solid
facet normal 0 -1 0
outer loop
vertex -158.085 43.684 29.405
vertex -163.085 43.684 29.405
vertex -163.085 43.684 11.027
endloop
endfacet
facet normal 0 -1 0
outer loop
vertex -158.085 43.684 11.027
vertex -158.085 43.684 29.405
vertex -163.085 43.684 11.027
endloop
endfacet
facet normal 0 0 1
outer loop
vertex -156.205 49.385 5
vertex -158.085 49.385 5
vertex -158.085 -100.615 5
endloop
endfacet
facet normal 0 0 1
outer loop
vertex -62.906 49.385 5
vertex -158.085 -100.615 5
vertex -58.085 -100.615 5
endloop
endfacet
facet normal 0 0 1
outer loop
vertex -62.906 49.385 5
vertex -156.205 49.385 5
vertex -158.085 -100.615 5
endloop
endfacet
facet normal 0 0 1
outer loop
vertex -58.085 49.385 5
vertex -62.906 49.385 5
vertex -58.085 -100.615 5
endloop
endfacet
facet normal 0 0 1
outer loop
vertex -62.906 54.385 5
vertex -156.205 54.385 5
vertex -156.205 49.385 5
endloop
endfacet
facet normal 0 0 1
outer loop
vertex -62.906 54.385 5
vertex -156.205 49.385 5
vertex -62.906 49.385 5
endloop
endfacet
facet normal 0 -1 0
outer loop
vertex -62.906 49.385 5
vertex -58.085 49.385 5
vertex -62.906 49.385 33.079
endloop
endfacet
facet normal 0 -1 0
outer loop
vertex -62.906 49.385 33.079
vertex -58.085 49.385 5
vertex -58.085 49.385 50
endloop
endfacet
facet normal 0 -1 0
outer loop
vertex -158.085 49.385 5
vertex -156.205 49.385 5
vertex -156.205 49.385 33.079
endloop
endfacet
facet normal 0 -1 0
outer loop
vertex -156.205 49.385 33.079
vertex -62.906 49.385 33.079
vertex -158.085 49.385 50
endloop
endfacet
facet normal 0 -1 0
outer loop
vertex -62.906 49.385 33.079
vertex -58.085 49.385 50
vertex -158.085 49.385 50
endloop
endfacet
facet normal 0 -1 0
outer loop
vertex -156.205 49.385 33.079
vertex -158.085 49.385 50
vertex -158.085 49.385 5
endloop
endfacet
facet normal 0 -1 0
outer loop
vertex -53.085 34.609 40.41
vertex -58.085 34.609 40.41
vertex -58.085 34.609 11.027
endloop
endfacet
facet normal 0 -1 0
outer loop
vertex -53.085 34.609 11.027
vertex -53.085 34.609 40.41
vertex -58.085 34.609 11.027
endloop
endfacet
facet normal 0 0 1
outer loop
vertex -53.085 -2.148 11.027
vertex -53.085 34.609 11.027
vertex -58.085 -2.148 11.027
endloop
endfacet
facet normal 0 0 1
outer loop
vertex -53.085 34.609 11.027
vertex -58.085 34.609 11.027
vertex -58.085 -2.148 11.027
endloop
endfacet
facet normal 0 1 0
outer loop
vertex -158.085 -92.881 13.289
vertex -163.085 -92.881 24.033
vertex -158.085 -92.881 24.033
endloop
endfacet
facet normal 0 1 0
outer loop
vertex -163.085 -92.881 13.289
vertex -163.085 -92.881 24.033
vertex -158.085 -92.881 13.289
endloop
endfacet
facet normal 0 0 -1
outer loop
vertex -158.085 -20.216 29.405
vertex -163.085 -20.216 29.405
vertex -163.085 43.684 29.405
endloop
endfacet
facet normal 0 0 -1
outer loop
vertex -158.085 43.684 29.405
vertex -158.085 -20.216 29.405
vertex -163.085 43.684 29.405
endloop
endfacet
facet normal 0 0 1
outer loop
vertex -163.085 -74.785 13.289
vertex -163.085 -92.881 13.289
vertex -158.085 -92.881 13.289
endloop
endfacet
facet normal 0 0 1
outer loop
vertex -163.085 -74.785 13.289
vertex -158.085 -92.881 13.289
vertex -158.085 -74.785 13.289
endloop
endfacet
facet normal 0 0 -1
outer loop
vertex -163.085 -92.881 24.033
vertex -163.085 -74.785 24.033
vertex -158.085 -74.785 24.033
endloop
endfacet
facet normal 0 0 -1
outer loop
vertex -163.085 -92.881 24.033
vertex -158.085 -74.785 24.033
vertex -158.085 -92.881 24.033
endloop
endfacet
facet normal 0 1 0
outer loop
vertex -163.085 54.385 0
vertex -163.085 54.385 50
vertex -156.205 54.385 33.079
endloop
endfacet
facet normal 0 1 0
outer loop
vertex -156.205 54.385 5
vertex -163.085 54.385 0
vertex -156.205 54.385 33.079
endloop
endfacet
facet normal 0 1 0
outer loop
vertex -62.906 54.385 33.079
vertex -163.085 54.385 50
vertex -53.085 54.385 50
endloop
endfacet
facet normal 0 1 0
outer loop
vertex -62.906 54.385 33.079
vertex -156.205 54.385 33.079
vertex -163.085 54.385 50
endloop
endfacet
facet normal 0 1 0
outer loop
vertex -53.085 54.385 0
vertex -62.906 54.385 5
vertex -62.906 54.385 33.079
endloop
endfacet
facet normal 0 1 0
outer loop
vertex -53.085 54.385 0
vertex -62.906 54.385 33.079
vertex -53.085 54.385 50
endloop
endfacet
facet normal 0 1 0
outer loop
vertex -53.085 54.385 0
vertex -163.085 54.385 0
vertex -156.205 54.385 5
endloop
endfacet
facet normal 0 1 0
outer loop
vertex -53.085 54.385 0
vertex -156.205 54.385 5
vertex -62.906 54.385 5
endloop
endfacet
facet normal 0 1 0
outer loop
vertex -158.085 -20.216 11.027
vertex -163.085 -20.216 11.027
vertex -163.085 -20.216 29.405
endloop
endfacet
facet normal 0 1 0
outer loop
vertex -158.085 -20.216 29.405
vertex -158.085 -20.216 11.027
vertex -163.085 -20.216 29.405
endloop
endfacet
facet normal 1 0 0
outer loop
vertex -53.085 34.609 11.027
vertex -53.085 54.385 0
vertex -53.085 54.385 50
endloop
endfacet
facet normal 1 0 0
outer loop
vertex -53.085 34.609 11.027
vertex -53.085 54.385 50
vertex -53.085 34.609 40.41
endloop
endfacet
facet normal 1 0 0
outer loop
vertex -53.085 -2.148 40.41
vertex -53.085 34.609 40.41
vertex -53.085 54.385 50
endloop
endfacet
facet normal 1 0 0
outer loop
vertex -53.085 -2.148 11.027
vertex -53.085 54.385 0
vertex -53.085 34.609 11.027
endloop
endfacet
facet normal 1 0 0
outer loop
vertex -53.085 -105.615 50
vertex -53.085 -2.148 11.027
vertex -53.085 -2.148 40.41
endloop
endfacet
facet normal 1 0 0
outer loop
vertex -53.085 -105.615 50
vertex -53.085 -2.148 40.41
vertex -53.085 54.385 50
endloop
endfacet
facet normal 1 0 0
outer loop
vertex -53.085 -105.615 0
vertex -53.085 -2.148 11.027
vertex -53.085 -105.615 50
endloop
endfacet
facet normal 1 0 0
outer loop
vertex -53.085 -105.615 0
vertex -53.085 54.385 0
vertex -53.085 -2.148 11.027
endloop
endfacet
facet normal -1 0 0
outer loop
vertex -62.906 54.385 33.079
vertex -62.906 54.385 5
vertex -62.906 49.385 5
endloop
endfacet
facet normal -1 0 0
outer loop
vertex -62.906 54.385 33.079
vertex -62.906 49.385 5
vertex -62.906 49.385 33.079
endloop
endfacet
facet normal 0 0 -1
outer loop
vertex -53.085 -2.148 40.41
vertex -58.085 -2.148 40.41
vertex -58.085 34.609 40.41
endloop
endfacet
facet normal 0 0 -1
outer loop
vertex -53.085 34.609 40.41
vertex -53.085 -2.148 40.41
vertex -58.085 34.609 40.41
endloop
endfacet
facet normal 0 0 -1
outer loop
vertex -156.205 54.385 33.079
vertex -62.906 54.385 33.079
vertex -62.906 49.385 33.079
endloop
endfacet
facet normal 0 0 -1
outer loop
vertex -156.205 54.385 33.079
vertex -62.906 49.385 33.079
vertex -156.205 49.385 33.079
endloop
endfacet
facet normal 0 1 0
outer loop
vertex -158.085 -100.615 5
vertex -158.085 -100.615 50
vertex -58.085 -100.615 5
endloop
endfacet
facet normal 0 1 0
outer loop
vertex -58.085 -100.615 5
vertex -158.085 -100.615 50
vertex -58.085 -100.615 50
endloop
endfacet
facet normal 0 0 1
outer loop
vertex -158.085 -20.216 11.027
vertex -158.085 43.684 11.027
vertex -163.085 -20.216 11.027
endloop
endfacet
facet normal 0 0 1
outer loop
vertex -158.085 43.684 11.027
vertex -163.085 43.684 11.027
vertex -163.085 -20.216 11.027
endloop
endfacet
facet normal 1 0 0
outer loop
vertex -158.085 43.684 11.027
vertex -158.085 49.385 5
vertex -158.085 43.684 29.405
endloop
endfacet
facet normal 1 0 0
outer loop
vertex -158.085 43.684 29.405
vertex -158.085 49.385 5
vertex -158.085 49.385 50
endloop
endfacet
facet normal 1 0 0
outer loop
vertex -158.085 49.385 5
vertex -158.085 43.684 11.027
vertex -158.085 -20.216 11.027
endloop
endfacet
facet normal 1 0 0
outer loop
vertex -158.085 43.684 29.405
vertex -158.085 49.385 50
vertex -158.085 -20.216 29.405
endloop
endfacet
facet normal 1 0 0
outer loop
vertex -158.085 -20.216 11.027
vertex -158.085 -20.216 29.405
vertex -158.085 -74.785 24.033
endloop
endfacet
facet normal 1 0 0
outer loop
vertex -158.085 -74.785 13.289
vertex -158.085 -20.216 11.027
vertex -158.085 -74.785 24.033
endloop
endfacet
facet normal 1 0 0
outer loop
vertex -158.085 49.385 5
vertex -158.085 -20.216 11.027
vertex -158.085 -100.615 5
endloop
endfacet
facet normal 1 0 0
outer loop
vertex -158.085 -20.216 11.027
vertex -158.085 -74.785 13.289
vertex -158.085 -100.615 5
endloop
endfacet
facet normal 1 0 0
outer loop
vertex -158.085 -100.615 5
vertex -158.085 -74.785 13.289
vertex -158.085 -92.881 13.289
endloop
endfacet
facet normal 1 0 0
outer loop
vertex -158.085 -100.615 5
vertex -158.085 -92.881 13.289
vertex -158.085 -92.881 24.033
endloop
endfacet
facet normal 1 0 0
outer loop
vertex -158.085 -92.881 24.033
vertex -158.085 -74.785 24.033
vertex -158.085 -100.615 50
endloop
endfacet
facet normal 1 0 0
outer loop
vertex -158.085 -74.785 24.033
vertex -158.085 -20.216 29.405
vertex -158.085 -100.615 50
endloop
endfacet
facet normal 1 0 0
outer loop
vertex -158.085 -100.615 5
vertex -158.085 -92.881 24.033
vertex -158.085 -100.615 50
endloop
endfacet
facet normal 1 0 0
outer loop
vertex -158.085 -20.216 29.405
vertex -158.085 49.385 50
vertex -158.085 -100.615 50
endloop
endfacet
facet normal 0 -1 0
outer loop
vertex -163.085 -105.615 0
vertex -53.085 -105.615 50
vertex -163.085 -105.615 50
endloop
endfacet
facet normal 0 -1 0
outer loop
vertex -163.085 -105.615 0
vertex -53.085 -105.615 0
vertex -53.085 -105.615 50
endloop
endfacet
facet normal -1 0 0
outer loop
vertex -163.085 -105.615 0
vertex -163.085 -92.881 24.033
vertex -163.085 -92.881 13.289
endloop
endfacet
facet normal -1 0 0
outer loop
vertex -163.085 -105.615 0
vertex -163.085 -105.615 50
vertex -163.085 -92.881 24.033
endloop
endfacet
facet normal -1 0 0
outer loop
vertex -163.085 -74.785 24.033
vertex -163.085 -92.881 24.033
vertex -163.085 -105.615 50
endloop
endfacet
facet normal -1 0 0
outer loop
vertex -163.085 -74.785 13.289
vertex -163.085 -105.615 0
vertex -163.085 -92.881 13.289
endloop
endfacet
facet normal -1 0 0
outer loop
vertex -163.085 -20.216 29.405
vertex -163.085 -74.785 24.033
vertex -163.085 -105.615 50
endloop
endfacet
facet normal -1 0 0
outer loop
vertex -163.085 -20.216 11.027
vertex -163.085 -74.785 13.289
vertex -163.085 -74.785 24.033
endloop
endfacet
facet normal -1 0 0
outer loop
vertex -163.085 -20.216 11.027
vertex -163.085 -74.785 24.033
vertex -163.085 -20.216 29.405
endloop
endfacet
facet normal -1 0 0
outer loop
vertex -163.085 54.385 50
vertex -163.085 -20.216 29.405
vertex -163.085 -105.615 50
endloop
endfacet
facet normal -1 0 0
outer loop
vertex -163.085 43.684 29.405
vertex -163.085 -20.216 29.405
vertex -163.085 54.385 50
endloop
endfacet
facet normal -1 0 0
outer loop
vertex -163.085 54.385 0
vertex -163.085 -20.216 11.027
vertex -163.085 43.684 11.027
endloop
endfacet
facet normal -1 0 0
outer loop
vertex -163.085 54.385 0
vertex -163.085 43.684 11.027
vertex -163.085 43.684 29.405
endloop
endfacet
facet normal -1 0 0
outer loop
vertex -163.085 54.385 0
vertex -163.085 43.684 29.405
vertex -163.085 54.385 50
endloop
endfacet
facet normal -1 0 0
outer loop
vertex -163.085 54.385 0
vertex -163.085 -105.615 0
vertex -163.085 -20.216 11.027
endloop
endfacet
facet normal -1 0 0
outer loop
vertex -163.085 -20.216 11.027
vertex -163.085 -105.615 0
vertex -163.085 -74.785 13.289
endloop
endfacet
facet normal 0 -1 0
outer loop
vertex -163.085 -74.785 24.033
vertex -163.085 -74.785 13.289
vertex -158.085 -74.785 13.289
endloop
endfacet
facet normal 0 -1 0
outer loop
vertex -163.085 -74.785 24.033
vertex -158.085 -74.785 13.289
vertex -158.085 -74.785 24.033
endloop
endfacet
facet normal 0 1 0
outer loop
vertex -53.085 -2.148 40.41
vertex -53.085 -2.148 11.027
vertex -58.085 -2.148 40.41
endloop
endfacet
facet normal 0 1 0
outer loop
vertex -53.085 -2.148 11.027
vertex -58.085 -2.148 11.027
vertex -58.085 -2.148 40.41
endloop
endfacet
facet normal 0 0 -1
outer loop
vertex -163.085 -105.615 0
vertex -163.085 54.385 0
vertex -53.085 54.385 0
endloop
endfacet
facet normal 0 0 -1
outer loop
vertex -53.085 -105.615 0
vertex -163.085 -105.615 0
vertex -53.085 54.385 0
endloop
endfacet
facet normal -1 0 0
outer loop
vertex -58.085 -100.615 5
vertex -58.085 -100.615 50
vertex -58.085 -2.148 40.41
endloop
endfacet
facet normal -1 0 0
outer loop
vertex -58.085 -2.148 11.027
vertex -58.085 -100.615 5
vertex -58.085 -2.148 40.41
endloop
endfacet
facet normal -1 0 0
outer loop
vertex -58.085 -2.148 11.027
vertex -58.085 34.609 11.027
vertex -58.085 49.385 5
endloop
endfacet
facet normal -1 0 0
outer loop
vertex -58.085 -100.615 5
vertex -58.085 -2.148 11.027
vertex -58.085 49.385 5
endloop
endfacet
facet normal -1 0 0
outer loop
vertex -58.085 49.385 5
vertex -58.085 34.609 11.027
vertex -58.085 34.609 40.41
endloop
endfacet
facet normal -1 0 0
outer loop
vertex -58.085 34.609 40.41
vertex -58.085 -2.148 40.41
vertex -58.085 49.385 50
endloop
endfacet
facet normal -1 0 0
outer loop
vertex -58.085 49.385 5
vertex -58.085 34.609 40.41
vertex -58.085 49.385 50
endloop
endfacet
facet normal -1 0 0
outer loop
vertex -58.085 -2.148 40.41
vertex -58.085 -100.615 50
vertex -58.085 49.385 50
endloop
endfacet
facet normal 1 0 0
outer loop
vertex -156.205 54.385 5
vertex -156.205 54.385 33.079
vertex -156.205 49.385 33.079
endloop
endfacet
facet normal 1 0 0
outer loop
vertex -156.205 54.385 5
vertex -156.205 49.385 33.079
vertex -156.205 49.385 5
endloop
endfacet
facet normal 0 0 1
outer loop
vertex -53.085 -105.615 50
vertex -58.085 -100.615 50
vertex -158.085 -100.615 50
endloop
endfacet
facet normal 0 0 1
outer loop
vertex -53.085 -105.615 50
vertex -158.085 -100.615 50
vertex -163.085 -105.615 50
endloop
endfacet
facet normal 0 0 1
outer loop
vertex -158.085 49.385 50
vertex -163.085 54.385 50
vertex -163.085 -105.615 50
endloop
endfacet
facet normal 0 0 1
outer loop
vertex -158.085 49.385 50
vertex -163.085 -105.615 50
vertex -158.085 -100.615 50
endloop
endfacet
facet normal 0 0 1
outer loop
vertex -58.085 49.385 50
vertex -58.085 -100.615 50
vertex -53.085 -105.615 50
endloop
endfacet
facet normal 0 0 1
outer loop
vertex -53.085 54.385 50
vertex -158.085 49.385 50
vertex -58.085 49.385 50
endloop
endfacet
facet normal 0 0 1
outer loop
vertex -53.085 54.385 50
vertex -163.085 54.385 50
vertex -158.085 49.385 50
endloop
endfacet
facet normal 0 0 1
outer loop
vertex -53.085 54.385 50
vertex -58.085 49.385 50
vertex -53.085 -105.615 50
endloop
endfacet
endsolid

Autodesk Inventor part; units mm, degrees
ref_plane "YZ Plane" through (0, 0, 0) normal (1, 0, 0) x (0, 1, 0)
ref_plane "XZ Plane" through (0, 0, 0) normal (0, 1, 0) x (-1, 0, 0)
ref_plane "XY Plane" through (0, 0, 0) normal (0, 0, 1) x (1, 0, 0)
sketch "Sketch3" plane through (0, 0, 0) normal (0, 0, 1) x (1, 0, 0)
  line L0 (-163.0852, 54.3849) -> (-53.0852, 54.3849)
  line L1 (-53.0852, 54.3849) -> (-53.0852, -105.6151)
  line L2 (-53.0852, -105.6151) -> (-163.0852, -105.6151)
  line L3 (-163.0852, -105.6151) -> (-163.0852, 54.3849)
  point P0 (0, 0)
  dimension "d2" = 110
  dimension "d3" = 160
  dimension "d4" = 110
extrude "Extrusion1" add sketch "Sketch3" along normal blind 50
sketch "Sketch4" plane through (0, 0, 50) normal (0, 0, 1) x (1, 0, 0)
  point P0 (0, 0)
sketch "Sketch5" plane through (0, 0, 50) normal (0, 0, 1) x (1, 0, 0)
  line L0 (-163.0852, 54.3849) -> (-163.0852, -105.6151) projected
  line L1 (-163.0852, 54.3849) -> (-163.0852, 49.3849)
  line L2 (-163.0852, 49.3849) -> (-158.0852, 49.3849)
  line L3 (-158.0852, 49.3849) -> (-158.0852, -100.6151)
  line L4 (-158.0852, -100.6151) -> (-58.0852, -100.6151)
  line L5 (-58.0852, -100.6151) -> (-58.0852, 49.3849)
  line L6 (-58.0852, 49.3849) -> (-158.0852, 49.3849)
  point P0 (0, 0)
  dimension "d7" = 5
  dimension "d8" = 5
  dimension "d9" = 150
  dimension "d10" = 100
extrude "Extrusion2" cut sketch "Sketch5" against normal blind 45
sketch "Sketch6" plane through (-163.0852, 54.3849, 0) normal (0, 1, 0) x (1, 0, 0)
  line L0 (5, -5) -> (105, -5) projected
  line L1 (100.1792, -33.0786) -> (6.8805, -33.0786)
  line L2 (6.8805, -33.0786) -> (6.8805, -5)
  line L3 (6.8805, -5) -> (100.1792, -5)
  line L4 (100.1792, -5) -> (100.1792, -33.0786)
  point P0 (163.0852, 0)
extrude "Extrusion3" cut sketch "Sketch6" against normal blind 45
sketch "Sketch7" plane through (-163.0852, -105.6151, 0) normal (-1, 0, 0) x (0, 0, 1)
  line L0 (29.4052, 149.2988) -> (11.027, 149.2988)
  line L1 (11.027, 149.2988) -> (11.027, 85.399)
  line L2 (11.027, 85.399) -> (29.4052, 85.399)
  line L3 (29.4052, 85.399) -> (29.4052, 149.2988)
  line L4 (24.0331, 12.7342) -> (13.2889, 12.7342)
  line L5 (13.2889, 12.7342) -> (13.2889, 30.8297)
  line L6 (13.2889, 30.8297) -> (24.0331, 30.8297)
  line L7 (24.0331, 30.8297) -> (24.0331, 12.7342)
  point P0 (0, 105.6151)
extrude "Extrusion4" cut sketch "Sketch7" against normal blind 45 contours L3 L2 L1 L0
extrude "Extrusion5" cut sketch "Sketch7" against normal blind 45 contours L4 L5 L6 L7
sketch "Sketch8" plane through (-58.0852, -100.6151, 50) normal (-1, 0, 0) x (0, 0, 1)
  line L0 (-38.973, 144.2988) -> (-38.973, 80.399) projected
  line L1 (-9.5905, 135.2241) -> (-38.973, 135.2241)
  line L2 (-38.973, 135.2241) -> (-38.973, 98.4676)
  line L3 (-38.973, 98.4676) -> (-9.5905, 98.4676)
  line L4 (-9.5905, 98.4676) -> (-9.5905, 135.2241)
  point P0 (-50, 100.6151)
extrude "Extrusion6" cut sketch "Sketch8" against normal blind 45
properties material "Rubber"
